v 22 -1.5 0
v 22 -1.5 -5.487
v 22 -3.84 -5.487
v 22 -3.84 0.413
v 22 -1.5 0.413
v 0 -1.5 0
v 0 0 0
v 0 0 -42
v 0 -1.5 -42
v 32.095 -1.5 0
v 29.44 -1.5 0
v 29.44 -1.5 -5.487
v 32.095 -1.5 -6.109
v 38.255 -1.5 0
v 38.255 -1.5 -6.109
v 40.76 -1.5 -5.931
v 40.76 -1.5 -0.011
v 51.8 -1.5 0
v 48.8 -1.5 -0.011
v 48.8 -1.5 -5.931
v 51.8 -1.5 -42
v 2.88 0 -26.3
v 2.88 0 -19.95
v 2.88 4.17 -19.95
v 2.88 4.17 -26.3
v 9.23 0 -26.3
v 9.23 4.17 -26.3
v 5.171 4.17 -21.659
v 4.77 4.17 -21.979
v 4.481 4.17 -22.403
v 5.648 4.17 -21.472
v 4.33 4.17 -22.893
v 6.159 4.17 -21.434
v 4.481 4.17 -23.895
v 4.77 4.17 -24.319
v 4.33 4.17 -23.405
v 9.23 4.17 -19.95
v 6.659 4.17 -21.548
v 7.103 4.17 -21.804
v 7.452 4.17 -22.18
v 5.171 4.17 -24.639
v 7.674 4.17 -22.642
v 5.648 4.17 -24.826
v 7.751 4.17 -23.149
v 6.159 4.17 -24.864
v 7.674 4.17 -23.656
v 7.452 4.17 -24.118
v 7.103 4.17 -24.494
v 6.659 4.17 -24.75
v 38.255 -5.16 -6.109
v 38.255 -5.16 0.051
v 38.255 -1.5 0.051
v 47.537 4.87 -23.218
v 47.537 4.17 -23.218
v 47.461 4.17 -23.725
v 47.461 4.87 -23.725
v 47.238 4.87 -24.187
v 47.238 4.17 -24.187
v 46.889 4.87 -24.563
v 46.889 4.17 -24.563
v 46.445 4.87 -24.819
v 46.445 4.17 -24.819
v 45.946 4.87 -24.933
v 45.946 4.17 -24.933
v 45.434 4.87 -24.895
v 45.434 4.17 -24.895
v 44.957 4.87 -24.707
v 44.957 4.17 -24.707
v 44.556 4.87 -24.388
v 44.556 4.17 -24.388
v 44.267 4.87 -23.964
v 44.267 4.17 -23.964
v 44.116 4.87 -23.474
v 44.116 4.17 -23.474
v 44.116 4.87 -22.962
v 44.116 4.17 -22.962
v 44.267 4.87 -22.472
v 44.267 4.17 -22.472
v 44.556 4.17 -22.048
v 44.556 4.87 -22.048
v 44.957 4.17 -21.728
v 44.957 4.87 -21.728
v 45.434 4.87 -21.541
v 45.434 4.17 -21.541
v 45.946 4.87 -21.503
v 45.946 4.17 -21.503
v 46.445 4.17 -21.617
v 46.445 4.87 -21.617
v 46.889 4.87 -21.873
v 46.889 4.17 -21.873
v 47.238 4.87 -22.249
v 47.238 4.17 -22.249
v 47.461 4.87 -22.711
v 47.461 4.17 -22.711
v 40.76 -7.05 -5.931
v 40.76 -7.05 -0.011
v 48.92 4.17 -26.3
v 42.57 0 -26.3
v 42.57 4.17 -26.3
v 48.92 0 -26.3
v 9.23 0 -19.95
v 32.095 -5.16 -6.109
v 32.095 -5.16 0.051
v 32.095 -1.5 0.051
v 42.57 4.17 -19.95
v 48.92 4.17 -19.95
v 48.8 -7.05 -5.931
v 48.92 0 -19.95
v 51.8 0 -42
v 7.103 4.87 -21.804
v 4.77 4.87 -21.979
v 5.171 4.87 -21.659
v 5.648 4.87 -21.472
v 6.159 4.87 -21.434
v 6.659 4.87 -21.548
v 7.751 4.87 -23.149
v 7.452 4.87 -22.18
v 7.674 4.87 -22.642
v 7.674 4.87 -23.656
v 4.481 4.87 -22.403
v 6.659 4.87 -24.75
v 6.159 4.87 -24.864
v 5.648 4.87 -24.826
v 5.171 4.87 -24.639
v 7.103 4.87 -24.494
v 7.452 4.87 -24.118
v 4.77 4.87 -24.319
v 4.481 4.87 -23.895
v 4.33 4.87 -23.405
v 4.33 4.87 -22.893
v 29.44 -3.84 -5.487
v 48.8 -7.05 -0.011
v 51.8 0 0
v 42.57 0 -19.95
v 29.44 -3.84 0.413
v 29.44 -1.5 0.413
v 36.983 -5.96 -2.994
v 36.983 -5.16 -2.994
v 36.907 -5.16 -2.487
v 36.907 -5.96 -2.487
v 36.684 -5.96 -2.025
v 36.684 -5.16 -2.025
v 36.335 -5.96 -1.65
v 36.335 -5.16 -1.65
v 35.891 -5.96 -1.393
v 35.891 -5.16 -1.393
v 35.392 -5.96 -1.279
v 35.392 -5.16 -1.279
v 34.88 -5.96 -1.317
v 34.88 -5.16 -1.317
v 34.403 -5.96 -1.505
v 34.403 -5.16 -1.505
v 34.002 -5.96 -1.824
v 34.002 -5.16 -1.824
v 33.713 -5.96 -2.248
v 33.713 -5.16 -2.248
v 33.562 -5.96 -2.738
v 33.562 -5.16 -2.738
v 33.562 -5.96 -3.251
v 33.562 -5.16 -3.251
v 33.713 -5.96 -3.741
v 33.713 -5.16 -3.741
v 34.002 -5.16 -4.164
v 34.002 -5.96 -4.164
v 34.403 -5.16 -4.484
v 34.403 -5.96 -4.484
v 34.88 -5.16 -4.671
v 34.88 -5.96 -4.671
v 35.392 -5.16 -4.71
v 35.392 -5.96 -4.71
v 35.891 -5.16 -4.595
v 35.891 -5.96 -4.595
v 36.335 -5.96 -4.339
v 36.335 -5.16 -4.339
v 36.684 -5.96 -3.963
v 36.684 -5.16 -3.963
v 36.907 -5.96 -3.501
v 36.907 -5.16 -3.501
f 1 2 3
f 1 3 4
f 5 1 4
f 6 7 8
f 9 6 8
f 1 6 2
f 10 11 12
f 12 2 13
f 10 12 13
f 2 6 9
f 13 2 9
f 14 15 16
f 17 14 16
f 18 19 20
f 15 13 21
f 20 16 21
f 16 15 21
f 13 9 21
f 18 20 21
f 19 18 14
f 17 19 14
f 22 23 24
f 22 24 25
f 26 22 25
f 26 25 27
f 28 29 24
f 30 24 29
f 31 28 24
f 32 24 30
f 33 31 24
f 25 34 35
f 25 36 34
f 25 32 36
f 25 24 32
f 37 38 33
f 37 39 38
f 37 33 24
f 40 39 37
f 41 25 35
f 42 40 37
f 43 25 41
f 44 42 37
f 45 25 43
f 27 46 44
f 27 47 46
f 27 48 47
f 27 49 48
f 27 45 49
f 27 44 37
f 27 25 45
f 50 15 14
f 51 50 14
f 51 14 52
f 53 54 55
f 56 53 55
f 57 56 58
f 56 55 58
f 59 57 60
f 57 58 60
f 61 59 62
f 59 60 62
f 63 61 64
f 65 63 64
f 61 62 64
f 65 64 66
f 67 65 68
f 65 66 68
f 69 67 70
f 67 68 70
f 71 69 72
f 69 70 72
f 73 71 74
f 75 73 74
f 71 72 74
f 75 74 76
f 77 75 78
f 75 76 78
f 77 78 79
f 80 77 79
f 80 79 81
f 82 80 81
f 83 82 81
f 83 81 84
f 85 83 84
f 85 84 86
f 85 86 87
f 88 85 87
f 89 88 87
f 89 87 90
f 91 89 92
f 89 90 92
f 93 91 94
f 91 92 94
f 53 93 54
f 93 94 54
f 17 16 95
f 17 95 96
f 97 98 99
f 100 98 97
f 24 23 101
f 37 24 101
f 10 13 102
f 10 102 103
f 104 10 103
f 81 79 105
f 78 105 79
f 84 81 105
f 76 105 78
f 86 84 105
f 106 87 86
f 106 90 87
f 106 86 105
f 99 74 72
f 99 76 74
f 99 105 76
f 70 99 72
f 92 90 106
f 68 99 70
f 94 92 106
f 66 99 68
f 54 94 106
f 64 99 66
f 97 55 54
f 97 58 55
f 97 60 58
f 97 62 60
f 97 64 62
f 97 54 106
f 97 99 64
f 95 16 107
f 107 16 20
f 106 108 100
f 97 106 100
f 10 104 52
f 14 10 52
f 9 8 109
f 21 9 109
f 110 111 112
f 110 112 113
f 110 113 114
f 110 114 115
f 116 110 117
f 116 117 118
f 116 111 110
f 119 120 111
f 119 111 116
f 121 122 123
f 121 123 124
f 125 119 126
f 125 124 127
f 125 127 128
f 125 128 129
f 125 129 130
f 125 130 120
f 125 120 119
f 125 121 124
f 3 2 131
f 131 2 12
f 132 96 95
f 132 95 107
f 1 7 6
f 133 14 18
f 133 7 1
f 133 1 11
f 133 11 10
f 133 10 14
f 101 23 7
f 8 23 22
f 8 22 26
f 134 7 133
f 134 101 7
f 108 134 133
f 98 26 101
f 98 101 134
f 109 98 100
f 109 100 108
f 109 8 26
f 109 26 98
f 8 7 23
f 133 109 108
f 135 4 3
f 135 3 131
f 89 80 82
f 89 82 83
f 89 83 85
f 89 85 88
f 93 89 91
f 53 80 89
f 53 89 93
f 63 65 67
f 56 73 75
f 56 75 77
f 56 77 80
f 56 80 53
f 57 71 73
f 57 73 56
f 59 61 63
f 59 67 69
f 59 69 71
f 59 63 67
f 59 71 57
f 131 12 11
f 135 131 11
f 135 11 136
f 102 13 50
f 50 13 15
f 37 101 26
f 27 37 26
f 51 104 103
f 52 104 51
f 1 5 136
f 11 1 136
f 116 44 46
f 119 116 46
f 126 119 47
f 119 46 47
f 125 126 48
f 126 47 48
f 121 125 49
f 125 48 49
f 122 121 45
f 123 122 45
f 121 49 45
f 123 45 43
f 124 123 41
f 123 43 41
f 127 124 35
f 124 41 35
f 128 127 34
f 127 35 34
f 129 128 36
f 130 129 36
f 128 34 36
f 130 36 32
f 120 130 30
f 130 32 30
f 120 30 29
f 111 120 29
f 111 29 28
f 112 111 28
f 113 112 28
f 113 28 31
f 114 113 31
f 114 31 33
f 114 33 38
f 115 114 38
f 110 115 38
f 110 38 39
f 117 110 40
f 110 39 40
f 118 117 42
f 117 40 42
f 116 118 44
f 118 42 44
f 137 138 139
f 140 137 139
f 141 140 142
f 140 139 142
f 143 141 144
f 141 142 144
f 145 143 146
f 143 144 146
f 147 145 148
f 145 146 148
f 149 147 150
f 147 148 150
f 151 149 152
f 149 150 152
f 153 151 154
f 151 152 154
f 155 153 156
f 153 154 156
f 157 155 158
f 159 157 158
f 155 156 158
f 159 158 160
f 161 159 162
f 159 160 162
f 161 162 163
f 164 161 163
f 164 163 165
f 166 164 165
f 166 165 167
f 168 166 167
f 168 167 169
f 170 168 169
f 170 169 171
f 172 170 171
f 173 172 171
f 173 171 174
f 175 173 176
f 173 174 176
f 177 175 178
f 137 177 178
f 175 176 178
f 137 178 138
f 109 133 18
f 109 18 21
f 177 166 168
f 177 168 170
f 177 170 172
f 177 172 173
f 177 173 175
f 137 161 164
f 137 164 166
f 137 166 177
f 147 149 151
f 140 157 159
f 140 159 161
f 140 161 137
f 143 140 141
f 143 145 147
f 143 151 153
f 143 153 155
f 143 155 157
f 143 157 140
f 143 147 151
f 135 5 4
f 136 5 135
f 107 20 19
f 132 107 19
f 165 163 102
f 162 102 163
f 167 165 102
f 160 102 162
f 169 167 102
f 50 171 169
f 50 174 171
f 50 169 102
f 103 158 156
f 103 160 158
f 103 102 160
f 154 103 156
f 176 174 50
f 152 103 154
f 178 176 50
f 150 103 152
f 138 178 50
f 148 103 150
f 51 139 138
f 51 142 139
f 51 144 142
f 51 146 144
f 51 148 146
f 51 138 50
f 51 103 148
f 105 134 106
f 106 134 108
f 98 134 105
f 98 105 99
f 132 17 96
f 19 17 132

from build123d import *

# Parameters (mm, degrees)
ESQUISSE1_W        = 51.8
ESQUISSE1_H        = 42
BOSS_EXTRU_1_DEPTH = 1.5
ESQUISSE2_W        = 6.35
ESQUISSE2_H        = 6.35
BOSS_EXTRU_2_DEPTH = 4.17
ESQUISSE3_R        = 1.72
BOSS_EXTRU_3_DEPTH = 0.7
ESQUISSE7_W        = 6.16
ESQUISSE7_H        = 6.16
BOSS_EXTRU_4_DEPTH = 3.66
ESQUISSE5_W        = 7.44
ESQUISSE5_H        = 5.9
BOSS_EXTRU_5_DEPTH = 2.34
ESQUISSE6_W        = 8.04
ESQUISSE6_H        = 5.92
BOSS_EXTRU_6_DEPTH = 5.55
ESQUISSE8_R        = 1.72
BOSS_EXTRU_7_DEPTH = 0.8


with BuildPart() as part:
    # Esquisse1 → Boss.-Extru.1 (new body)
    with BuildSketch(Plane(origin=(0, 0, 0), x_dir=(1, 0, 0), z_dir=(0, 1, 0))):
        with Locations((25.9, 21)):
            Rectangle(ESQUISSE1_W, ESQUISSE1_H)
    extrude(amount=-BOSS_EXTRU_1_DEPTH)

    # Esquisse2 → Boss.-Extru.2 (add)
    with BuildSketch(Plane(origin=(0, 0, 0), x_dir=(1, 0, 0), z_dir=(0, 1, 0))):
        with Locations((45.745, 23.125)):
            Rectangle(ESQUISSE2_W, ESQUISSE2_H)
        with Locations((6.055, 23.125)):
            Rectangle(ESQUISSE2_W, ESQUISSE2_H)
    extrude(amount=BOSS_EXTRU_2_DEPTH)

    # Esquisse3 → Boss.-Extru.3 (add)
    with BuildSketch(Plane(origin=(0, 4.17, 0), x_dir=(1, 0, 0), z_dir=(0, 1, 0))):
        with Locations((6.030530149, 23.148945457)):
            Circle(ESQUISSE3_R)
        with Locations((45.817014074, 23.217873135)):
            Circle(ESQUISSE3_R)
    extrude(amount=BOSS_EXTRU_3_DEPTH)

    # Esquisse7 → Boss.-Extru.4 (add)
    with BuildSketch(Plane.XZ.offset(1.5)):
        with Locations((35.174690325, -3.02873507)):
            Rectangle(ESQUISSE7_W, ESQUISSE7_H)
    extrude(amount=BOSS_EXTRU_4_DEPTH)

    # Esquisse5 → Boss.-Extru.5 (add)
    with BuildSketch(Plane.XZ.offset(1.5)):
        with Locations((25.72, -2.536674281)):
            Rectangle(ESQUISSE5_W, ESQUISSE5_H)
    extrude(amount=BOSS_EXTRU_5_DEPTH)

    # Esquisse6 → Boss.-Extru.6 (add)
    with BuildSketch(Plane.XZ.offset(1.5)):
        with Locations((44.78, -2.971238989)):
            Rectangle(ESQUISSE6_W, ESQUISSE6_H)
    extrude(amount=BOSS_EXTRU_6_DEPTH)

    # Esquisse8 → Boss.-Extru.7 (add)
    with BuildSketch(Plane.XZ.offset(5.16)):
        with Locations((35.263038033, -2.994330068)):
            Circle(ESQUISSE8_R)
    extrude(amount=BOSS_EXTRU_7_DEPTH)


solid = part.part
